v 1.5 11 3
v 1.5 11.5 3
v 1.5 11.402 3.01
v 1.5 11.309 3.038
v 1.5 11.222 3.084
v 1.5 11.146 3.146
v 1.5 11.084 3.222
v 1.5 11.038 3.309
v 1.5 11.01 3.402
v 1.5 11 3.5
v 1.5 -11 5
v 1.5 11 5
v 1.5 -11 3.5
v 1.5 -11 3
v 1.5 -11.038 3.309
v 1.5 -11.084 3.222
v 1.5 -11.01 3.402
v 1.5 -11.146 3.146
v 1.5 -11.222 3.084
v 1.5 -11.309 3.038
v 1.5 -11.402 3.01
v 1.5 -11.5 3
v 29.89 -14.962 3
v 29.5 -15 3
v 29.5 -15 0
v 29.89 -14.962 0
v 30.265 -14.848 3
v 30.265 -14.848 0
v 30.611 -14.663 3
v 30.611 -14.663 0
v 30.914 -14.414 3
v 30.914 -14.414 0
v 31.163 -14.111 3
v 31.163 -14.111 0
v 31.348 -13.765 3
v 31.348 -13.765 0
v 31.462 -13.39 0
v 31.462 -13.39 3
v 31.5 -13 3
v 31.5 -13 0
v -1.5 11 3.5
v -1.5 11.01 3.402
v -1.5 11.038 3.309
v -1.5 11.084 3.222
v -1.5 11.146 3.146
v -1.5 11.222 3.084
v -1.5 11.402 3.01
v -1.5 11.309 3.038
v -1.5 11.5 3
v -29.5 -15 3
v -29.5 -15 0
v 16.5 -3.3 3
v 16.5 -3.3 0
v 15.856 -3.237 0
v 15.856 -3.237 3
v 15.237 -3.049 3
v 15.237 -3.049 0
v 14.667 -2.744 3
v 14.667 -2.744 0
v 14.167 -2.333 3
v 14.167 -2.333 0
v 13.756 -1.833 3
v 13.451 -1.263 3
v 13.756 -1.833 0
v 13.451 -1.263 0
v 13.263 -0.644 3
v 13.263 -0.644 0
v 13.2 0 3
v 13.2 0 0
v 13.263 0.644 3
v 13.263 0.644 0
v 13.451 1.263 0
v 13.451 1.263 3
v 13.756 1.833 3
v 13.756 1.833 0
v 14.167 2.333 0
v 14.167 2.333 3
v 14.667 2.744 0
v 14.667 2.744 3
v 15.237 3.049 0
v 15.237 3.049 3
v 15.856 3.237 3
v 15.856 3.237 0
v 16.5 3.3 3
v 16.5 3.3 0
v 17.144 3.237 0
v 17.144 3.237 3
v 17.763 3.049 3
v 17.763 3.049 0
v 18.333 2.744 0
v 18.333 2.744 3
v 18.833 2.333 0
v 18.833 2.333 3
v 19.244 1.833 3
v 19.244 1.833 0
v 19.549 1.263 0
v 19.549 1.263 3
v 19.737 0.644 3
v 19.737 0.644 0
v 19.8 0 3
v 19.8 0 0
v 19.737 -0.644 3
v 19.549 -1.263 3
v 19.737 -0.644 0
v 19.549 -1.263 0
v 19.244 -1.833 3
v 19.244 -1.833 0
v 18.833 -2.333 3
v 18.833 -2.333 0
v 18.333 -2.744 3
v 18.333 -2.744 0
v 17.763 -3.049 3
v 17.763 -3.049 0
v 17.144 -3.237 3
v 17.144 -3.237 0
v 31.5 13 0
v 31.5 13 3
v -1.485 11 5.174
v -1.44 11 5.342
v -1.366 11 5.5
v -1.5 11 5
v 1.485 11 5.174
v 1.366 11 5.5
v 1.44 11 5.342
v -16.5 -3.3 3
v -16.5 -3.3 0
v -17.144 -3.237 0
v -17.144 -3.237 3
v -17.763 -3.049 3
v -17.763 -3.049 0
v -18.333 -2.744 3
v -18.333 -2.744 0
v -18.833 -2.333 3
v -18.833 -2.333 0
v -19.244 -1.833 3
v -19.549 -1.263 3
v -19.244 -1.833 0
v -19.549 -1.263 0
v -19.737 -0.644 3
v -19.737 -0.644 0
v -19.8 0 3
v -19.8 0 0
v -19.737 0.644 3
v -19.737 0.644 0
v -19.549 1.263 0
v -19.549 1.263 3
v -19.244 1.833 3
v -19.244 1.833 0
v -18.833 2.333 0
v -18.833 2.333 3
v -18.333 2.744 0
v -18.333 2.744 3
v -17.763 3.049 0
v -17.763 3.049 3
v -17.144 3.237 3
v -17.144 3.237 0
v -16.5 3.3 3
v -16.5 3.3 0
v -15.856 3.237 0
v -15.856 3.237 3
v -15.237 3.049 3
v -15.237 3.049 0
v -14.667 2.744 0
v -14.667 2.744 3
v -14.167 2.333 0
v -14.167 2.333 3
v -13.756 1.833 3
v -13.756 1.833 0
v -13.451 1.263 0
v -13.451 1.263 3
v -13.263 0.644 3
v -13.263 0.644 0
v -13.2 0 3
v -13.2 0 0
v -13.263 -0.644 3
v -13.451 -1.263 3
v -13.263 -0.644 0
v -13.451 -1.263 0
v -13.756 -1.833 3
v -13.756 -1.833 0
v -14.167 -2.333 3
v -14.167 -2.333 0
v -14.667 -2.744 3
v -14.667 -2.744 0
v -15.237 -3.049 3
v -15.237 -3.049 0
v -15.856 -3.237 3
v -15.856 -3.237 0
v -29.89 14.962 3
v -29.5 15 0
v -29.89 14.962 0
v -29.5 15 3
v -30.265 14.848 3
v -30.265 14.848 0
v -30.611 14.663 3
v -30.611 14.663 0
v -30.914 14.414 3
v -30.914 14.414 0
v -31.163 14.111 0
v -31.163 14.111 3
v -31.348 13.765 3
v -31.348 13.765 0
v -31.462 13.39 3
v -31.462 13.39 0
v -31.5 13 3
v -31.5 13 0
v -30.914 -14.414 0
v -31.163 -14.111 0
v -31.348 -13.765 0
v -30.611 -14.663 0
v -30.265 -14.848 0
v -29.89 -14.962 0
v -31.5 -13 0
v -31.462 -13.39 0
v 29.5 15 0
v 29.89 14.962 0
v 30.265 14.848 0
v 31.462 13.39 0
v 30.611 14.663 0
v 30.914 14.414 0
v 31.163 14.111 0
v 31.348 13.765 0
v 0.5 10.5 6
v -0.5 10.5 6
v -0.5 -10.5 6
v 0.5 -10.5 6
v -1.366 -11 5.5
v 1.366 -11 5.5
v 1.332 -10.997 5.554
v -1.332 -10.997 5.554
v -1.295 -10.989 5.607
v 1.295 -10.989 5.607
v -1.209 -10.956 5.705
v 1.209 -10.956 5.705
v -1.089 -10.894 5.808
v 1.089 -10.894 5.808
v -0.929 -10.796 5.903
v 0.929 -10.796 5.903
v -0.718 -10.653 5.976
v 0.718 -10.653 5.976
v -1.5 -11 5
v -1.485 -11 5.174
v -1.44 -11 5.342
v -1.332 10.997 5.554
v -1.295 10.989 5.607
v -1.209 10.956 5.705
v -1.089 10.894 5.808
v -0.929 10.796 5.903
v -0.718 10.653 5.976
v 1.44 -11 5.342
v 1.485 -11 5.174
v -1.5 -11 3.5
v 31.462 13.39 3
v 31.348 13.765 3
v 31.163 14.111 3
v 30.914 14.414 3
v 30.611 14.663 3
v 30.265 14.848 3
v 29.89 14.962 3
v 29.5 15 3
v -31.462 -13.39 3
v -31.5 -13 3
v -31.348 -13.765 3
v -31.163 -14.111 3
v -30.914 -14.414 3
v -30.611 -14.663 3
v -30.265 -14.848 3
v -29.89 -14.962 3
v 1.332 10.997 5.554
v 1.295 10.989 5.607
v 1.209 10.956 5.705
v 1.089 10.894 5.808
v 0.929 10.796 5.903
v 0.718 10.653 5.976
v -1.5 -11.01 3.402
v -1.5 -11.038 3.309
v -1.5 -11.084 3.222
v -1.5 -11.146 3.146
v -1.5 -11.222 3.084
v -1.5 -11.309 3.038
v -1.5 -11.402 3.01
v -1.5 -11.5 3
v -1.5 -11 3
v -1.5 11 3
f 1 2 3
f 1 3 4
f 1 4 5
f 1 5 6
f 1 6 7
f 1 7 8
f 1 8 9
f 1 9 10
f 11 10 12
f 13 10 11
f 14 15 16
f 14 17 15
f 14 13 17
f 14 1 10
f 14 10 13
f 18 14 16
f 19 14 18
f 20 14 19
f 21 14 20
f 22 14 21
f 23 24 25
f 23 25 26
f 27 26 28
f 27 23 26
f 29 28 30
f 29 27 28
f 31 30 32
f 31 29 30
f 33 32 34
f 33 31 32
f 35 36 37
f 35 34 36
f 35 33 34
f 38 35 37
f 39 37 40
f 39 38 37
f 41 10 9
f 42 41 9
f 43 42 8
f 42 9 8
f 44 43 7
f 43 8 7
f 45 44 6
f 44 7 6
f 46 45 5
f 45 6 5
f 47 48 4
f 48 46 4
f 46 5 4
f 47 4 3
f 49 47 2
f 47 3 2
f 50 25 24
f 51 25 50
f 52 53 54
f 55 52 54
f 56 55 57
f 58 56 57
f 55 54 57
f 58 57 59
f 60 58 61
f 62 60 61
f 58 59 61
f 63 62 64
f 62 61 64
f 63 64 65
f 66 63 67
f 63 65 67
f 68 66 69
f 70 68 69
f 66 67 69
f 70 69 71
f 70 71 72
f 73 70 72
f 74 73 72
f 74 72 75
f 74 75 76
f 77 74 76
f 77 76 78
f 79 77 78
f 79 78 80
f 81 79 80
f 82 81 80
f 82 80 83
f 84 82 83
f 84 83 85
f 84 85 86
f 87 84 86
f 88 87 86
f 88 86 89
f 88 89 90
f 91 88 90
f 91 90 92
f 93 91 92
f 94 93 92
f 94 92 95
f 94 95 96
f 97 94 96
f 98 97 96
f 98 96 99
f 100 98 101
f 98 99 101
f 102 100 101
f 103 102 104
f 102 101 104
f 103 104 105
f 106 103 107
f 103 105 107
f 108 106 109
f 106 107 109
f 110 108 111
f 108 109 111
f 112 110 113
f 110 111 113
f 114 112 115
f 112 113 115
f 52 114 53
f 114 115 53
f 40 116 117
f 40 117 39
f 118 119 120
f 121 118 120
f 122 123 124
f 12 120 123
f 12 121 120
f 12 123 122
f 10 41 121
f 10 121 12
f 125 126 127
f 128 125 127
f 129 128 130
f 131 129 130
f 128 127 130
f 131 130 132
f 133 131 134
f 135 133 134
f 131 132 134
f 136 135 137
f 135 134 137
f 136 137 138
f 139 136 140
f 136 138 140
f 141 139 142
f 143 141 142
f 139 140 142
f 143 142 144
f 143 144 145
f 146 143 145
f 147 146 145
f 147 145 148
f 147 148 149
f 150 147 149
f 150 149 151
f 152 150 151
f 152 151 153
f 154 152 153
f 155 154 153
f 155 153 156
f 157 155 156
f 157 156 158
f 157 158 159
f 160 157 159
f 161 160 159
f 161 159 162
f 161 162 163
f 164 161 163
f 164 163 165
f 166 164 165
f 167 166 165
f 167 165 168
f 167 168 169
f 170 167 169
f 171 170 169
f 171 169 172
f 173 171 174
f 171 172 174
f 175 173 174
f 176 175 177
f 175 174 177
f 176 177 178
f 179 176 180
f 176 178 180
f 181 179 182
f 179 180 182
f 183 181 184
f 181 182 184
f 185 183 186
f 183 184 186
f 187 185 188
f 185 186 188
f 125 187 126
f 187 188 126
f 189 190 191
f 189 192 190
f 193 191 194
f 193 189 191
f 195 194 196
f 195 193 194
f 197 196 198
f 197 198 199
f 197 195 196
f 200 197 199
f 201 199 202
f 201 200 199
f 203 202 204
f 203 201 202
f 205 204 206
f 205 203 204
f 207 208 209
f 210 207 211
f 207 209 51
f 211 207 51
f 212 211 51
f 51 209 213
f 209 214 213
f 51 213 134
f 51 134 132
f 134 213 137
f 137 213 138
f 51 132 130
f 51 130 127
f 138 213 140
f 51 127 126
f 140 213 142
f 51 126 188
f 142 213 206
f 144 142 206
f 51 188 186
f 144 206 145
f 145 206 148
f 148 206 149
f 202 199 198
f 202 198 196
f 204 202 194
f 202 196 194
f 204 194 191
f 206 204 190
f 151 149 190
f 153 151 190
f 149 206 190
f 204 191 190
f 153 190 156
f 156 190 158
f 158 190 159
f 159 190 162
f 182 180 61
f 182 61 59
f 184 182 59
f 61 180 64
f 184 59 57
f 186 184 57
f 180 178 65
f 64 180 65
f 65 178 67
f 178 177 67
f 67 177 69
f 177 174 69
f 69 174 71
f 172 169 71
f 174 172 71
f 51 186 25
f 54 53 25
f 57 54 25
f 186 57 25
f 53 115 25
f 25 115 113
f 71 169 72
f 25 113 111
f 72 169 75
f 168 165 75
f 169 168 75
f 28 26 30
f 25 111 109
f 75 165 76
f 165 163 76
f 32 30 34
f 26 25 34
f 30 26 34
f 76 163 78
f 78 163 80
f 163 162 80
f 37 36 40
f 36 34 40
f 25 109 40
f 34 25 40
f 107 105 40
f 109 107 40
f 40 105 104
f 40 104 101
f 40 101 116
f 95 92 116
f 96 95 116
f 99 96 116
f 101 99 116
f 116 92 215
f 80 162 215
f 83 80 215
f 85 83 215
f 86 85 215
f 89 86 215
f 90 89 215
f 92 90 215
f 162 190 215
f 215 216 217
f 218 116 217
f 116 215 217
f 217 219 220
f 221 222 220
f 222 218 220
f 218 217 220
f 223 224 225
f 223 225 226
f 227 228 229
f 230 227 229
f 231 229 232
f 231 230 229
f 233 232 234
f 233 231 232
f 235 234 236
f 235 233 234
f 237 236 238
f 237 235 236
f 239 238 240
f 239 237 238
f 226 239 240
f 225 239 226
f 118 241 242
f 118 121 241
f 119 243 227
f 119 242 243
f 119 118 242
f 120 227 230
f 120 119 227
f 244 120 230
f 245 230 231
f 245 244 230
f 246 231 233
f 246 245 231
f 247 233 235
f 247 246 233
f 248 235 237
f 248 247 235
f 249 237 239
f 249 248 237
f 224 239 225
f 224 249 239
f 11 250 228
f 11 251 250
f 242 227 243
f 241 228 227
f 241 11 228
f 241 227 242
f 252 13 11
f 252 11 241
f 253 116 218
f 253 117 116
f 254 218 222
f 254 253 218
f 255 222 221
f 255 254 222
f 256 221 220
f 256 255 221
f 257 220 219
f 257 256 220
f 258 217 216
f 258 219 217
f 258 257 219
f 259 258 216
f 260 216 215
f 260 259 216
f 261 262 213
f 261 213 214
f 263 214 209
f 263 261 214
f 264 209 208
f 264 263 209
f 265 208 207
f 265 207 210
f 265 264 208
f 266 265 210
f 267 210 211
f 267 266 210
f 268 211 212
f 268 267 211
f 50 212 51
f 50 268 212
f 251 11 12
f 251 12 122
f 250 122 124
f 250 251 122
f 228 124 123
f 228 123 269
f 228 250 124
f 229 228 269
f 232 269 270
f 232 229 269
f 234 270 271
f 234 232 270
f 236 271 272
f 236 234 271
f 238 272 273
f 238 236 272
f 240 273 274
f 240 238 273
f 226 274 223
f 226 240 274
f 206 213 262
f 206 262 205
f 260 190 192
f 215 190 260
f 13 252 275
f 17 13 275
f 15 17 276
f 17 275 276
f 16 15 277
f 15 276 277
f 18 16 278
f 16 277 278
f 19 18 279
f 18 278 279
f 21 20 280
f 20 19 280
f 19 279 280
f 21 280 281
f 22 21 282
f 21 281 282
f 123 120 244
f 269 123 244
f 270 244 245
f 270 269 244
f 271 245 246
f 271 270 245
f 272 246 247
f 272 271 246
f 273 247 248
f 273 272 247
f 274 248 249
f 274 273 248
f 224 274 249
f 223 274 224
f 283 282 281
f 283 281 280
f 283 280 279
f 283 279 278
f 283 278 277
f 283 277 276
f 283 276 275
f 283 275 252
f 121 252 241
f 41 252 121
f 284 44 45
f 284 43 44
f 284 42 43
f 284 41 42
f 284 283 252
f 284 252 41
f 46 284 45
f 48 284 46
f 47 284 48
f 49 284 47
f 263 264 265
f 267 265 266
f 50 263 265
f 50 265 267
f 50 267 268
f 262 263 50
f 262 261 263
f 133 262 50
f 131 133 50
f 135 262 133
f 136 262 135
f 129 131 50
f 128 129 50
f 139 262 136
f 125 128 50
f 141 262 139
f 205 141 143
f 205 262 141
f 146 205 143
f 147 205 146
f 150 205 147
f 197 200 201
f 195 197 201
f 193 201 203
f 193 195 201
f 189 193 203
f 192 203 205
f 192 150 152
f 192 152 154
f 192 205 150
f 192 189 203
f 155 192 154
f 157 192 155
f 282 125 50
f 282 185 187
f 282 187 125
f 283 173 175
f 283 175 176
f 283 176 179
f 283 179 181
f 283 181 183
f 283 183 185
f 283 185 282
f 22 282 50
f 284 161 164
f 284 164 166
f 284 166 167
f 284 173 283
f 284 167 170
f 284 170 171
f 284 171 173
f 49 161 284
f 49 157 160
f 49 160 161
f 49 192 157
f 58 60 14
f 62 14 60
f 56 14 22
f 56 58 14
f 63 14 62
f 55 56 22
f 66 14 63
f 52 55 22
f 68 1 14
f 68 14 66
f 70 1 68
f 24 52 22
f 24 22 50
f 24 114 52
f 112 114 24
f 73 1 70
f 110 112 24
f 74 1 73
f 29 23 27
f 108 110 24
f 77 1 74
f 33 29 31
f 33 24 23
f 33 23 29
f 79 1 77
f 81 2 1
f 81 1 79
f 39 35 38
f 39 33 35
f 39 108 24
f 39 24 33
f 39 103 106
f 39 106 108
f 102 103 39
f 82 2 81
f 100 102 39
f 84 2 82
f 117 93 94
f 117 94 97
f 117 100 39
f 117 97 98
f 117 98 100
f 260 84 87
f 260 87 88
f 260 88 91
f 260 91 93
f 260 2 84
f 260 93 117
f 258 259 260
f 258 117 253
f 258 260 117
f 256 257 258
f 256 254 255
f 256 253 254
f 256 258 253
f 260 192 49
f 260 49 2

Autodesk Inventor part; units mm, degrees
ref_plane "YZ Plane" through (0, 0, 0) normal (1, 0, 0) x (0, 1, 0)
ref_plane "XZ Plane" through (0, 0, 0) normal (0, 1, 0) x (-1, 0, 0)
ref_plane "XY Plane" through (0, 0, 0) normal (0, 0, 1) x (1, 0, 0)
sketch "スケッチ2" plane through (0, 0, 0) normal (0, 0, 1) x (1, 0, 0)
  line L0 (-31.5, 15) -> (31.5, 15)
  line L1 (31.5, 15) -> (31.5, -15)
  line L2 (31.5, -15) -> (-31.5, -15)
  line L3 (-31.5, -15) -> (-31.5, 15)
  line L4 (0, 24.6) -> (0, -21.6) construction
  line L5 (-44.1, 0) -> (44.1, 0) construction
  line L6 (-31.5, 15) -> (31.5, 15)
  line L7 (31.5, 15) -> (31.5, 18)
  line L8 (31.5, 18) -> (-31.5, 18)
  line L9 (-31.5, 18) -> (-31.5, 15)
  point P0 (0, 0)
  point P1 (31.5, 15)
  dimension "d1" = 63
  dimension "d2" = 30
  dimension "d3" = 15
  dimension "d4" = 31.5
  dimension "d26" = 3
extrude "押し出し1" add sketch "スケッチ2" along normal blind 3 contours L0 L1 L2 L3
sketch "スケッチ3" plane through (0, 0, 3) normal (0, 0, 1) x (1, 0, 0)
  line L0 (-31.5, -15) -> (31.5, -15) construction
  line L1 (-44.1, 0) -> (44.1, 0) construction
  line L2 (31.5, -15) -> (31.5, 15) projected
  line L3 (31.5, 15) -> (-31.5, 15) projected
  line L4 (-31.5, 15) -> (-31.5, -15) projected
  point P0 (0, 0)
  point P1 (-16.5, 0)
  point P2 (16.5, 0)
hole "穴1" at (-16.5, 0, 3) at (16.5, 0, 3) direction (0, 0, -1) diameter 6.6 end through all
fillet "フィレット1" radius 2 4 edges at (31.5, -15, 1.5) (-31.5, -15, 1.5) (-31.5, 15, 1.5) (31.5, 15, 1.5)
sketch "スケッチ4" plane through (0, 0, 3) normal (0, 0, 1) x (1, 0, 0)
  line L0 (-29.5, -15) -> (29.5, -15) projected
  arc A0 (-31.5, -13) -> (-29.5, -15) centre (-29.5, -13) ccw projected
  line L1 (-29.5, -15) -> (29.5, -15) projected
  arc A1 (29.5, -15) -> (31.5, -13) centre (29.5, -13) ccw projected
  circle A2 centre (-16.5, 0) radius 3.3 projected
  circle A3 centre (16.5, 0) radius 3.3 projected
  line L2 (1.5, -11) -> (-1.5, -11)
  line L3 (-1.5, -11) -> (-1.5, 11)
  line L4 (-1.5, 11) -> (1.5, 11)
  line L5 (1.5, 11) -> (1.5, -11)
  line L6 (1.5, -11) -> (-1.5, 11) construction
  line L7 (-1.5, -11) -> (1.5, 11) construction
  line L8 (31.5, -13) -> (31.5, 13) projected
  line L9 (29.5, 15) -> (-29.5, 15) projected
  line L10 (-31.5, 13) -> (-31.5, -13) projected
  arc A4 (31.5, 13) -> (29.5, 15) centre (29.5, 13) ccw projected
  arc A5 (-29.5, 15) -> (-31.5, 13) centre (-29.5, 13) ccw projected
  point P0 (0, 0)
  dimension "d22" = 3
  dimension "d24" = 4
extrude "押し出し2" add sketch "スケッチ4" along normal blind 3 contours L2 L3 L4 L5
fillet "フィレット2" radius 1 2 edges at (-1.5, 0, 6) (1.5, 0, 6)
fillet "フィレット2" radius 0.5 4 edges at (0, 11, 3) (0, -11, 3) (0, 11, 6) (0, -11, 6)
equation "\"d3\" = 0.5 * d2"
equation "\"d4\" = 0.5 * d1"
equation "\"d24\" = d23"
equation "\"d23\" = 4"
properties part number "rocker_frame_mount_00"
